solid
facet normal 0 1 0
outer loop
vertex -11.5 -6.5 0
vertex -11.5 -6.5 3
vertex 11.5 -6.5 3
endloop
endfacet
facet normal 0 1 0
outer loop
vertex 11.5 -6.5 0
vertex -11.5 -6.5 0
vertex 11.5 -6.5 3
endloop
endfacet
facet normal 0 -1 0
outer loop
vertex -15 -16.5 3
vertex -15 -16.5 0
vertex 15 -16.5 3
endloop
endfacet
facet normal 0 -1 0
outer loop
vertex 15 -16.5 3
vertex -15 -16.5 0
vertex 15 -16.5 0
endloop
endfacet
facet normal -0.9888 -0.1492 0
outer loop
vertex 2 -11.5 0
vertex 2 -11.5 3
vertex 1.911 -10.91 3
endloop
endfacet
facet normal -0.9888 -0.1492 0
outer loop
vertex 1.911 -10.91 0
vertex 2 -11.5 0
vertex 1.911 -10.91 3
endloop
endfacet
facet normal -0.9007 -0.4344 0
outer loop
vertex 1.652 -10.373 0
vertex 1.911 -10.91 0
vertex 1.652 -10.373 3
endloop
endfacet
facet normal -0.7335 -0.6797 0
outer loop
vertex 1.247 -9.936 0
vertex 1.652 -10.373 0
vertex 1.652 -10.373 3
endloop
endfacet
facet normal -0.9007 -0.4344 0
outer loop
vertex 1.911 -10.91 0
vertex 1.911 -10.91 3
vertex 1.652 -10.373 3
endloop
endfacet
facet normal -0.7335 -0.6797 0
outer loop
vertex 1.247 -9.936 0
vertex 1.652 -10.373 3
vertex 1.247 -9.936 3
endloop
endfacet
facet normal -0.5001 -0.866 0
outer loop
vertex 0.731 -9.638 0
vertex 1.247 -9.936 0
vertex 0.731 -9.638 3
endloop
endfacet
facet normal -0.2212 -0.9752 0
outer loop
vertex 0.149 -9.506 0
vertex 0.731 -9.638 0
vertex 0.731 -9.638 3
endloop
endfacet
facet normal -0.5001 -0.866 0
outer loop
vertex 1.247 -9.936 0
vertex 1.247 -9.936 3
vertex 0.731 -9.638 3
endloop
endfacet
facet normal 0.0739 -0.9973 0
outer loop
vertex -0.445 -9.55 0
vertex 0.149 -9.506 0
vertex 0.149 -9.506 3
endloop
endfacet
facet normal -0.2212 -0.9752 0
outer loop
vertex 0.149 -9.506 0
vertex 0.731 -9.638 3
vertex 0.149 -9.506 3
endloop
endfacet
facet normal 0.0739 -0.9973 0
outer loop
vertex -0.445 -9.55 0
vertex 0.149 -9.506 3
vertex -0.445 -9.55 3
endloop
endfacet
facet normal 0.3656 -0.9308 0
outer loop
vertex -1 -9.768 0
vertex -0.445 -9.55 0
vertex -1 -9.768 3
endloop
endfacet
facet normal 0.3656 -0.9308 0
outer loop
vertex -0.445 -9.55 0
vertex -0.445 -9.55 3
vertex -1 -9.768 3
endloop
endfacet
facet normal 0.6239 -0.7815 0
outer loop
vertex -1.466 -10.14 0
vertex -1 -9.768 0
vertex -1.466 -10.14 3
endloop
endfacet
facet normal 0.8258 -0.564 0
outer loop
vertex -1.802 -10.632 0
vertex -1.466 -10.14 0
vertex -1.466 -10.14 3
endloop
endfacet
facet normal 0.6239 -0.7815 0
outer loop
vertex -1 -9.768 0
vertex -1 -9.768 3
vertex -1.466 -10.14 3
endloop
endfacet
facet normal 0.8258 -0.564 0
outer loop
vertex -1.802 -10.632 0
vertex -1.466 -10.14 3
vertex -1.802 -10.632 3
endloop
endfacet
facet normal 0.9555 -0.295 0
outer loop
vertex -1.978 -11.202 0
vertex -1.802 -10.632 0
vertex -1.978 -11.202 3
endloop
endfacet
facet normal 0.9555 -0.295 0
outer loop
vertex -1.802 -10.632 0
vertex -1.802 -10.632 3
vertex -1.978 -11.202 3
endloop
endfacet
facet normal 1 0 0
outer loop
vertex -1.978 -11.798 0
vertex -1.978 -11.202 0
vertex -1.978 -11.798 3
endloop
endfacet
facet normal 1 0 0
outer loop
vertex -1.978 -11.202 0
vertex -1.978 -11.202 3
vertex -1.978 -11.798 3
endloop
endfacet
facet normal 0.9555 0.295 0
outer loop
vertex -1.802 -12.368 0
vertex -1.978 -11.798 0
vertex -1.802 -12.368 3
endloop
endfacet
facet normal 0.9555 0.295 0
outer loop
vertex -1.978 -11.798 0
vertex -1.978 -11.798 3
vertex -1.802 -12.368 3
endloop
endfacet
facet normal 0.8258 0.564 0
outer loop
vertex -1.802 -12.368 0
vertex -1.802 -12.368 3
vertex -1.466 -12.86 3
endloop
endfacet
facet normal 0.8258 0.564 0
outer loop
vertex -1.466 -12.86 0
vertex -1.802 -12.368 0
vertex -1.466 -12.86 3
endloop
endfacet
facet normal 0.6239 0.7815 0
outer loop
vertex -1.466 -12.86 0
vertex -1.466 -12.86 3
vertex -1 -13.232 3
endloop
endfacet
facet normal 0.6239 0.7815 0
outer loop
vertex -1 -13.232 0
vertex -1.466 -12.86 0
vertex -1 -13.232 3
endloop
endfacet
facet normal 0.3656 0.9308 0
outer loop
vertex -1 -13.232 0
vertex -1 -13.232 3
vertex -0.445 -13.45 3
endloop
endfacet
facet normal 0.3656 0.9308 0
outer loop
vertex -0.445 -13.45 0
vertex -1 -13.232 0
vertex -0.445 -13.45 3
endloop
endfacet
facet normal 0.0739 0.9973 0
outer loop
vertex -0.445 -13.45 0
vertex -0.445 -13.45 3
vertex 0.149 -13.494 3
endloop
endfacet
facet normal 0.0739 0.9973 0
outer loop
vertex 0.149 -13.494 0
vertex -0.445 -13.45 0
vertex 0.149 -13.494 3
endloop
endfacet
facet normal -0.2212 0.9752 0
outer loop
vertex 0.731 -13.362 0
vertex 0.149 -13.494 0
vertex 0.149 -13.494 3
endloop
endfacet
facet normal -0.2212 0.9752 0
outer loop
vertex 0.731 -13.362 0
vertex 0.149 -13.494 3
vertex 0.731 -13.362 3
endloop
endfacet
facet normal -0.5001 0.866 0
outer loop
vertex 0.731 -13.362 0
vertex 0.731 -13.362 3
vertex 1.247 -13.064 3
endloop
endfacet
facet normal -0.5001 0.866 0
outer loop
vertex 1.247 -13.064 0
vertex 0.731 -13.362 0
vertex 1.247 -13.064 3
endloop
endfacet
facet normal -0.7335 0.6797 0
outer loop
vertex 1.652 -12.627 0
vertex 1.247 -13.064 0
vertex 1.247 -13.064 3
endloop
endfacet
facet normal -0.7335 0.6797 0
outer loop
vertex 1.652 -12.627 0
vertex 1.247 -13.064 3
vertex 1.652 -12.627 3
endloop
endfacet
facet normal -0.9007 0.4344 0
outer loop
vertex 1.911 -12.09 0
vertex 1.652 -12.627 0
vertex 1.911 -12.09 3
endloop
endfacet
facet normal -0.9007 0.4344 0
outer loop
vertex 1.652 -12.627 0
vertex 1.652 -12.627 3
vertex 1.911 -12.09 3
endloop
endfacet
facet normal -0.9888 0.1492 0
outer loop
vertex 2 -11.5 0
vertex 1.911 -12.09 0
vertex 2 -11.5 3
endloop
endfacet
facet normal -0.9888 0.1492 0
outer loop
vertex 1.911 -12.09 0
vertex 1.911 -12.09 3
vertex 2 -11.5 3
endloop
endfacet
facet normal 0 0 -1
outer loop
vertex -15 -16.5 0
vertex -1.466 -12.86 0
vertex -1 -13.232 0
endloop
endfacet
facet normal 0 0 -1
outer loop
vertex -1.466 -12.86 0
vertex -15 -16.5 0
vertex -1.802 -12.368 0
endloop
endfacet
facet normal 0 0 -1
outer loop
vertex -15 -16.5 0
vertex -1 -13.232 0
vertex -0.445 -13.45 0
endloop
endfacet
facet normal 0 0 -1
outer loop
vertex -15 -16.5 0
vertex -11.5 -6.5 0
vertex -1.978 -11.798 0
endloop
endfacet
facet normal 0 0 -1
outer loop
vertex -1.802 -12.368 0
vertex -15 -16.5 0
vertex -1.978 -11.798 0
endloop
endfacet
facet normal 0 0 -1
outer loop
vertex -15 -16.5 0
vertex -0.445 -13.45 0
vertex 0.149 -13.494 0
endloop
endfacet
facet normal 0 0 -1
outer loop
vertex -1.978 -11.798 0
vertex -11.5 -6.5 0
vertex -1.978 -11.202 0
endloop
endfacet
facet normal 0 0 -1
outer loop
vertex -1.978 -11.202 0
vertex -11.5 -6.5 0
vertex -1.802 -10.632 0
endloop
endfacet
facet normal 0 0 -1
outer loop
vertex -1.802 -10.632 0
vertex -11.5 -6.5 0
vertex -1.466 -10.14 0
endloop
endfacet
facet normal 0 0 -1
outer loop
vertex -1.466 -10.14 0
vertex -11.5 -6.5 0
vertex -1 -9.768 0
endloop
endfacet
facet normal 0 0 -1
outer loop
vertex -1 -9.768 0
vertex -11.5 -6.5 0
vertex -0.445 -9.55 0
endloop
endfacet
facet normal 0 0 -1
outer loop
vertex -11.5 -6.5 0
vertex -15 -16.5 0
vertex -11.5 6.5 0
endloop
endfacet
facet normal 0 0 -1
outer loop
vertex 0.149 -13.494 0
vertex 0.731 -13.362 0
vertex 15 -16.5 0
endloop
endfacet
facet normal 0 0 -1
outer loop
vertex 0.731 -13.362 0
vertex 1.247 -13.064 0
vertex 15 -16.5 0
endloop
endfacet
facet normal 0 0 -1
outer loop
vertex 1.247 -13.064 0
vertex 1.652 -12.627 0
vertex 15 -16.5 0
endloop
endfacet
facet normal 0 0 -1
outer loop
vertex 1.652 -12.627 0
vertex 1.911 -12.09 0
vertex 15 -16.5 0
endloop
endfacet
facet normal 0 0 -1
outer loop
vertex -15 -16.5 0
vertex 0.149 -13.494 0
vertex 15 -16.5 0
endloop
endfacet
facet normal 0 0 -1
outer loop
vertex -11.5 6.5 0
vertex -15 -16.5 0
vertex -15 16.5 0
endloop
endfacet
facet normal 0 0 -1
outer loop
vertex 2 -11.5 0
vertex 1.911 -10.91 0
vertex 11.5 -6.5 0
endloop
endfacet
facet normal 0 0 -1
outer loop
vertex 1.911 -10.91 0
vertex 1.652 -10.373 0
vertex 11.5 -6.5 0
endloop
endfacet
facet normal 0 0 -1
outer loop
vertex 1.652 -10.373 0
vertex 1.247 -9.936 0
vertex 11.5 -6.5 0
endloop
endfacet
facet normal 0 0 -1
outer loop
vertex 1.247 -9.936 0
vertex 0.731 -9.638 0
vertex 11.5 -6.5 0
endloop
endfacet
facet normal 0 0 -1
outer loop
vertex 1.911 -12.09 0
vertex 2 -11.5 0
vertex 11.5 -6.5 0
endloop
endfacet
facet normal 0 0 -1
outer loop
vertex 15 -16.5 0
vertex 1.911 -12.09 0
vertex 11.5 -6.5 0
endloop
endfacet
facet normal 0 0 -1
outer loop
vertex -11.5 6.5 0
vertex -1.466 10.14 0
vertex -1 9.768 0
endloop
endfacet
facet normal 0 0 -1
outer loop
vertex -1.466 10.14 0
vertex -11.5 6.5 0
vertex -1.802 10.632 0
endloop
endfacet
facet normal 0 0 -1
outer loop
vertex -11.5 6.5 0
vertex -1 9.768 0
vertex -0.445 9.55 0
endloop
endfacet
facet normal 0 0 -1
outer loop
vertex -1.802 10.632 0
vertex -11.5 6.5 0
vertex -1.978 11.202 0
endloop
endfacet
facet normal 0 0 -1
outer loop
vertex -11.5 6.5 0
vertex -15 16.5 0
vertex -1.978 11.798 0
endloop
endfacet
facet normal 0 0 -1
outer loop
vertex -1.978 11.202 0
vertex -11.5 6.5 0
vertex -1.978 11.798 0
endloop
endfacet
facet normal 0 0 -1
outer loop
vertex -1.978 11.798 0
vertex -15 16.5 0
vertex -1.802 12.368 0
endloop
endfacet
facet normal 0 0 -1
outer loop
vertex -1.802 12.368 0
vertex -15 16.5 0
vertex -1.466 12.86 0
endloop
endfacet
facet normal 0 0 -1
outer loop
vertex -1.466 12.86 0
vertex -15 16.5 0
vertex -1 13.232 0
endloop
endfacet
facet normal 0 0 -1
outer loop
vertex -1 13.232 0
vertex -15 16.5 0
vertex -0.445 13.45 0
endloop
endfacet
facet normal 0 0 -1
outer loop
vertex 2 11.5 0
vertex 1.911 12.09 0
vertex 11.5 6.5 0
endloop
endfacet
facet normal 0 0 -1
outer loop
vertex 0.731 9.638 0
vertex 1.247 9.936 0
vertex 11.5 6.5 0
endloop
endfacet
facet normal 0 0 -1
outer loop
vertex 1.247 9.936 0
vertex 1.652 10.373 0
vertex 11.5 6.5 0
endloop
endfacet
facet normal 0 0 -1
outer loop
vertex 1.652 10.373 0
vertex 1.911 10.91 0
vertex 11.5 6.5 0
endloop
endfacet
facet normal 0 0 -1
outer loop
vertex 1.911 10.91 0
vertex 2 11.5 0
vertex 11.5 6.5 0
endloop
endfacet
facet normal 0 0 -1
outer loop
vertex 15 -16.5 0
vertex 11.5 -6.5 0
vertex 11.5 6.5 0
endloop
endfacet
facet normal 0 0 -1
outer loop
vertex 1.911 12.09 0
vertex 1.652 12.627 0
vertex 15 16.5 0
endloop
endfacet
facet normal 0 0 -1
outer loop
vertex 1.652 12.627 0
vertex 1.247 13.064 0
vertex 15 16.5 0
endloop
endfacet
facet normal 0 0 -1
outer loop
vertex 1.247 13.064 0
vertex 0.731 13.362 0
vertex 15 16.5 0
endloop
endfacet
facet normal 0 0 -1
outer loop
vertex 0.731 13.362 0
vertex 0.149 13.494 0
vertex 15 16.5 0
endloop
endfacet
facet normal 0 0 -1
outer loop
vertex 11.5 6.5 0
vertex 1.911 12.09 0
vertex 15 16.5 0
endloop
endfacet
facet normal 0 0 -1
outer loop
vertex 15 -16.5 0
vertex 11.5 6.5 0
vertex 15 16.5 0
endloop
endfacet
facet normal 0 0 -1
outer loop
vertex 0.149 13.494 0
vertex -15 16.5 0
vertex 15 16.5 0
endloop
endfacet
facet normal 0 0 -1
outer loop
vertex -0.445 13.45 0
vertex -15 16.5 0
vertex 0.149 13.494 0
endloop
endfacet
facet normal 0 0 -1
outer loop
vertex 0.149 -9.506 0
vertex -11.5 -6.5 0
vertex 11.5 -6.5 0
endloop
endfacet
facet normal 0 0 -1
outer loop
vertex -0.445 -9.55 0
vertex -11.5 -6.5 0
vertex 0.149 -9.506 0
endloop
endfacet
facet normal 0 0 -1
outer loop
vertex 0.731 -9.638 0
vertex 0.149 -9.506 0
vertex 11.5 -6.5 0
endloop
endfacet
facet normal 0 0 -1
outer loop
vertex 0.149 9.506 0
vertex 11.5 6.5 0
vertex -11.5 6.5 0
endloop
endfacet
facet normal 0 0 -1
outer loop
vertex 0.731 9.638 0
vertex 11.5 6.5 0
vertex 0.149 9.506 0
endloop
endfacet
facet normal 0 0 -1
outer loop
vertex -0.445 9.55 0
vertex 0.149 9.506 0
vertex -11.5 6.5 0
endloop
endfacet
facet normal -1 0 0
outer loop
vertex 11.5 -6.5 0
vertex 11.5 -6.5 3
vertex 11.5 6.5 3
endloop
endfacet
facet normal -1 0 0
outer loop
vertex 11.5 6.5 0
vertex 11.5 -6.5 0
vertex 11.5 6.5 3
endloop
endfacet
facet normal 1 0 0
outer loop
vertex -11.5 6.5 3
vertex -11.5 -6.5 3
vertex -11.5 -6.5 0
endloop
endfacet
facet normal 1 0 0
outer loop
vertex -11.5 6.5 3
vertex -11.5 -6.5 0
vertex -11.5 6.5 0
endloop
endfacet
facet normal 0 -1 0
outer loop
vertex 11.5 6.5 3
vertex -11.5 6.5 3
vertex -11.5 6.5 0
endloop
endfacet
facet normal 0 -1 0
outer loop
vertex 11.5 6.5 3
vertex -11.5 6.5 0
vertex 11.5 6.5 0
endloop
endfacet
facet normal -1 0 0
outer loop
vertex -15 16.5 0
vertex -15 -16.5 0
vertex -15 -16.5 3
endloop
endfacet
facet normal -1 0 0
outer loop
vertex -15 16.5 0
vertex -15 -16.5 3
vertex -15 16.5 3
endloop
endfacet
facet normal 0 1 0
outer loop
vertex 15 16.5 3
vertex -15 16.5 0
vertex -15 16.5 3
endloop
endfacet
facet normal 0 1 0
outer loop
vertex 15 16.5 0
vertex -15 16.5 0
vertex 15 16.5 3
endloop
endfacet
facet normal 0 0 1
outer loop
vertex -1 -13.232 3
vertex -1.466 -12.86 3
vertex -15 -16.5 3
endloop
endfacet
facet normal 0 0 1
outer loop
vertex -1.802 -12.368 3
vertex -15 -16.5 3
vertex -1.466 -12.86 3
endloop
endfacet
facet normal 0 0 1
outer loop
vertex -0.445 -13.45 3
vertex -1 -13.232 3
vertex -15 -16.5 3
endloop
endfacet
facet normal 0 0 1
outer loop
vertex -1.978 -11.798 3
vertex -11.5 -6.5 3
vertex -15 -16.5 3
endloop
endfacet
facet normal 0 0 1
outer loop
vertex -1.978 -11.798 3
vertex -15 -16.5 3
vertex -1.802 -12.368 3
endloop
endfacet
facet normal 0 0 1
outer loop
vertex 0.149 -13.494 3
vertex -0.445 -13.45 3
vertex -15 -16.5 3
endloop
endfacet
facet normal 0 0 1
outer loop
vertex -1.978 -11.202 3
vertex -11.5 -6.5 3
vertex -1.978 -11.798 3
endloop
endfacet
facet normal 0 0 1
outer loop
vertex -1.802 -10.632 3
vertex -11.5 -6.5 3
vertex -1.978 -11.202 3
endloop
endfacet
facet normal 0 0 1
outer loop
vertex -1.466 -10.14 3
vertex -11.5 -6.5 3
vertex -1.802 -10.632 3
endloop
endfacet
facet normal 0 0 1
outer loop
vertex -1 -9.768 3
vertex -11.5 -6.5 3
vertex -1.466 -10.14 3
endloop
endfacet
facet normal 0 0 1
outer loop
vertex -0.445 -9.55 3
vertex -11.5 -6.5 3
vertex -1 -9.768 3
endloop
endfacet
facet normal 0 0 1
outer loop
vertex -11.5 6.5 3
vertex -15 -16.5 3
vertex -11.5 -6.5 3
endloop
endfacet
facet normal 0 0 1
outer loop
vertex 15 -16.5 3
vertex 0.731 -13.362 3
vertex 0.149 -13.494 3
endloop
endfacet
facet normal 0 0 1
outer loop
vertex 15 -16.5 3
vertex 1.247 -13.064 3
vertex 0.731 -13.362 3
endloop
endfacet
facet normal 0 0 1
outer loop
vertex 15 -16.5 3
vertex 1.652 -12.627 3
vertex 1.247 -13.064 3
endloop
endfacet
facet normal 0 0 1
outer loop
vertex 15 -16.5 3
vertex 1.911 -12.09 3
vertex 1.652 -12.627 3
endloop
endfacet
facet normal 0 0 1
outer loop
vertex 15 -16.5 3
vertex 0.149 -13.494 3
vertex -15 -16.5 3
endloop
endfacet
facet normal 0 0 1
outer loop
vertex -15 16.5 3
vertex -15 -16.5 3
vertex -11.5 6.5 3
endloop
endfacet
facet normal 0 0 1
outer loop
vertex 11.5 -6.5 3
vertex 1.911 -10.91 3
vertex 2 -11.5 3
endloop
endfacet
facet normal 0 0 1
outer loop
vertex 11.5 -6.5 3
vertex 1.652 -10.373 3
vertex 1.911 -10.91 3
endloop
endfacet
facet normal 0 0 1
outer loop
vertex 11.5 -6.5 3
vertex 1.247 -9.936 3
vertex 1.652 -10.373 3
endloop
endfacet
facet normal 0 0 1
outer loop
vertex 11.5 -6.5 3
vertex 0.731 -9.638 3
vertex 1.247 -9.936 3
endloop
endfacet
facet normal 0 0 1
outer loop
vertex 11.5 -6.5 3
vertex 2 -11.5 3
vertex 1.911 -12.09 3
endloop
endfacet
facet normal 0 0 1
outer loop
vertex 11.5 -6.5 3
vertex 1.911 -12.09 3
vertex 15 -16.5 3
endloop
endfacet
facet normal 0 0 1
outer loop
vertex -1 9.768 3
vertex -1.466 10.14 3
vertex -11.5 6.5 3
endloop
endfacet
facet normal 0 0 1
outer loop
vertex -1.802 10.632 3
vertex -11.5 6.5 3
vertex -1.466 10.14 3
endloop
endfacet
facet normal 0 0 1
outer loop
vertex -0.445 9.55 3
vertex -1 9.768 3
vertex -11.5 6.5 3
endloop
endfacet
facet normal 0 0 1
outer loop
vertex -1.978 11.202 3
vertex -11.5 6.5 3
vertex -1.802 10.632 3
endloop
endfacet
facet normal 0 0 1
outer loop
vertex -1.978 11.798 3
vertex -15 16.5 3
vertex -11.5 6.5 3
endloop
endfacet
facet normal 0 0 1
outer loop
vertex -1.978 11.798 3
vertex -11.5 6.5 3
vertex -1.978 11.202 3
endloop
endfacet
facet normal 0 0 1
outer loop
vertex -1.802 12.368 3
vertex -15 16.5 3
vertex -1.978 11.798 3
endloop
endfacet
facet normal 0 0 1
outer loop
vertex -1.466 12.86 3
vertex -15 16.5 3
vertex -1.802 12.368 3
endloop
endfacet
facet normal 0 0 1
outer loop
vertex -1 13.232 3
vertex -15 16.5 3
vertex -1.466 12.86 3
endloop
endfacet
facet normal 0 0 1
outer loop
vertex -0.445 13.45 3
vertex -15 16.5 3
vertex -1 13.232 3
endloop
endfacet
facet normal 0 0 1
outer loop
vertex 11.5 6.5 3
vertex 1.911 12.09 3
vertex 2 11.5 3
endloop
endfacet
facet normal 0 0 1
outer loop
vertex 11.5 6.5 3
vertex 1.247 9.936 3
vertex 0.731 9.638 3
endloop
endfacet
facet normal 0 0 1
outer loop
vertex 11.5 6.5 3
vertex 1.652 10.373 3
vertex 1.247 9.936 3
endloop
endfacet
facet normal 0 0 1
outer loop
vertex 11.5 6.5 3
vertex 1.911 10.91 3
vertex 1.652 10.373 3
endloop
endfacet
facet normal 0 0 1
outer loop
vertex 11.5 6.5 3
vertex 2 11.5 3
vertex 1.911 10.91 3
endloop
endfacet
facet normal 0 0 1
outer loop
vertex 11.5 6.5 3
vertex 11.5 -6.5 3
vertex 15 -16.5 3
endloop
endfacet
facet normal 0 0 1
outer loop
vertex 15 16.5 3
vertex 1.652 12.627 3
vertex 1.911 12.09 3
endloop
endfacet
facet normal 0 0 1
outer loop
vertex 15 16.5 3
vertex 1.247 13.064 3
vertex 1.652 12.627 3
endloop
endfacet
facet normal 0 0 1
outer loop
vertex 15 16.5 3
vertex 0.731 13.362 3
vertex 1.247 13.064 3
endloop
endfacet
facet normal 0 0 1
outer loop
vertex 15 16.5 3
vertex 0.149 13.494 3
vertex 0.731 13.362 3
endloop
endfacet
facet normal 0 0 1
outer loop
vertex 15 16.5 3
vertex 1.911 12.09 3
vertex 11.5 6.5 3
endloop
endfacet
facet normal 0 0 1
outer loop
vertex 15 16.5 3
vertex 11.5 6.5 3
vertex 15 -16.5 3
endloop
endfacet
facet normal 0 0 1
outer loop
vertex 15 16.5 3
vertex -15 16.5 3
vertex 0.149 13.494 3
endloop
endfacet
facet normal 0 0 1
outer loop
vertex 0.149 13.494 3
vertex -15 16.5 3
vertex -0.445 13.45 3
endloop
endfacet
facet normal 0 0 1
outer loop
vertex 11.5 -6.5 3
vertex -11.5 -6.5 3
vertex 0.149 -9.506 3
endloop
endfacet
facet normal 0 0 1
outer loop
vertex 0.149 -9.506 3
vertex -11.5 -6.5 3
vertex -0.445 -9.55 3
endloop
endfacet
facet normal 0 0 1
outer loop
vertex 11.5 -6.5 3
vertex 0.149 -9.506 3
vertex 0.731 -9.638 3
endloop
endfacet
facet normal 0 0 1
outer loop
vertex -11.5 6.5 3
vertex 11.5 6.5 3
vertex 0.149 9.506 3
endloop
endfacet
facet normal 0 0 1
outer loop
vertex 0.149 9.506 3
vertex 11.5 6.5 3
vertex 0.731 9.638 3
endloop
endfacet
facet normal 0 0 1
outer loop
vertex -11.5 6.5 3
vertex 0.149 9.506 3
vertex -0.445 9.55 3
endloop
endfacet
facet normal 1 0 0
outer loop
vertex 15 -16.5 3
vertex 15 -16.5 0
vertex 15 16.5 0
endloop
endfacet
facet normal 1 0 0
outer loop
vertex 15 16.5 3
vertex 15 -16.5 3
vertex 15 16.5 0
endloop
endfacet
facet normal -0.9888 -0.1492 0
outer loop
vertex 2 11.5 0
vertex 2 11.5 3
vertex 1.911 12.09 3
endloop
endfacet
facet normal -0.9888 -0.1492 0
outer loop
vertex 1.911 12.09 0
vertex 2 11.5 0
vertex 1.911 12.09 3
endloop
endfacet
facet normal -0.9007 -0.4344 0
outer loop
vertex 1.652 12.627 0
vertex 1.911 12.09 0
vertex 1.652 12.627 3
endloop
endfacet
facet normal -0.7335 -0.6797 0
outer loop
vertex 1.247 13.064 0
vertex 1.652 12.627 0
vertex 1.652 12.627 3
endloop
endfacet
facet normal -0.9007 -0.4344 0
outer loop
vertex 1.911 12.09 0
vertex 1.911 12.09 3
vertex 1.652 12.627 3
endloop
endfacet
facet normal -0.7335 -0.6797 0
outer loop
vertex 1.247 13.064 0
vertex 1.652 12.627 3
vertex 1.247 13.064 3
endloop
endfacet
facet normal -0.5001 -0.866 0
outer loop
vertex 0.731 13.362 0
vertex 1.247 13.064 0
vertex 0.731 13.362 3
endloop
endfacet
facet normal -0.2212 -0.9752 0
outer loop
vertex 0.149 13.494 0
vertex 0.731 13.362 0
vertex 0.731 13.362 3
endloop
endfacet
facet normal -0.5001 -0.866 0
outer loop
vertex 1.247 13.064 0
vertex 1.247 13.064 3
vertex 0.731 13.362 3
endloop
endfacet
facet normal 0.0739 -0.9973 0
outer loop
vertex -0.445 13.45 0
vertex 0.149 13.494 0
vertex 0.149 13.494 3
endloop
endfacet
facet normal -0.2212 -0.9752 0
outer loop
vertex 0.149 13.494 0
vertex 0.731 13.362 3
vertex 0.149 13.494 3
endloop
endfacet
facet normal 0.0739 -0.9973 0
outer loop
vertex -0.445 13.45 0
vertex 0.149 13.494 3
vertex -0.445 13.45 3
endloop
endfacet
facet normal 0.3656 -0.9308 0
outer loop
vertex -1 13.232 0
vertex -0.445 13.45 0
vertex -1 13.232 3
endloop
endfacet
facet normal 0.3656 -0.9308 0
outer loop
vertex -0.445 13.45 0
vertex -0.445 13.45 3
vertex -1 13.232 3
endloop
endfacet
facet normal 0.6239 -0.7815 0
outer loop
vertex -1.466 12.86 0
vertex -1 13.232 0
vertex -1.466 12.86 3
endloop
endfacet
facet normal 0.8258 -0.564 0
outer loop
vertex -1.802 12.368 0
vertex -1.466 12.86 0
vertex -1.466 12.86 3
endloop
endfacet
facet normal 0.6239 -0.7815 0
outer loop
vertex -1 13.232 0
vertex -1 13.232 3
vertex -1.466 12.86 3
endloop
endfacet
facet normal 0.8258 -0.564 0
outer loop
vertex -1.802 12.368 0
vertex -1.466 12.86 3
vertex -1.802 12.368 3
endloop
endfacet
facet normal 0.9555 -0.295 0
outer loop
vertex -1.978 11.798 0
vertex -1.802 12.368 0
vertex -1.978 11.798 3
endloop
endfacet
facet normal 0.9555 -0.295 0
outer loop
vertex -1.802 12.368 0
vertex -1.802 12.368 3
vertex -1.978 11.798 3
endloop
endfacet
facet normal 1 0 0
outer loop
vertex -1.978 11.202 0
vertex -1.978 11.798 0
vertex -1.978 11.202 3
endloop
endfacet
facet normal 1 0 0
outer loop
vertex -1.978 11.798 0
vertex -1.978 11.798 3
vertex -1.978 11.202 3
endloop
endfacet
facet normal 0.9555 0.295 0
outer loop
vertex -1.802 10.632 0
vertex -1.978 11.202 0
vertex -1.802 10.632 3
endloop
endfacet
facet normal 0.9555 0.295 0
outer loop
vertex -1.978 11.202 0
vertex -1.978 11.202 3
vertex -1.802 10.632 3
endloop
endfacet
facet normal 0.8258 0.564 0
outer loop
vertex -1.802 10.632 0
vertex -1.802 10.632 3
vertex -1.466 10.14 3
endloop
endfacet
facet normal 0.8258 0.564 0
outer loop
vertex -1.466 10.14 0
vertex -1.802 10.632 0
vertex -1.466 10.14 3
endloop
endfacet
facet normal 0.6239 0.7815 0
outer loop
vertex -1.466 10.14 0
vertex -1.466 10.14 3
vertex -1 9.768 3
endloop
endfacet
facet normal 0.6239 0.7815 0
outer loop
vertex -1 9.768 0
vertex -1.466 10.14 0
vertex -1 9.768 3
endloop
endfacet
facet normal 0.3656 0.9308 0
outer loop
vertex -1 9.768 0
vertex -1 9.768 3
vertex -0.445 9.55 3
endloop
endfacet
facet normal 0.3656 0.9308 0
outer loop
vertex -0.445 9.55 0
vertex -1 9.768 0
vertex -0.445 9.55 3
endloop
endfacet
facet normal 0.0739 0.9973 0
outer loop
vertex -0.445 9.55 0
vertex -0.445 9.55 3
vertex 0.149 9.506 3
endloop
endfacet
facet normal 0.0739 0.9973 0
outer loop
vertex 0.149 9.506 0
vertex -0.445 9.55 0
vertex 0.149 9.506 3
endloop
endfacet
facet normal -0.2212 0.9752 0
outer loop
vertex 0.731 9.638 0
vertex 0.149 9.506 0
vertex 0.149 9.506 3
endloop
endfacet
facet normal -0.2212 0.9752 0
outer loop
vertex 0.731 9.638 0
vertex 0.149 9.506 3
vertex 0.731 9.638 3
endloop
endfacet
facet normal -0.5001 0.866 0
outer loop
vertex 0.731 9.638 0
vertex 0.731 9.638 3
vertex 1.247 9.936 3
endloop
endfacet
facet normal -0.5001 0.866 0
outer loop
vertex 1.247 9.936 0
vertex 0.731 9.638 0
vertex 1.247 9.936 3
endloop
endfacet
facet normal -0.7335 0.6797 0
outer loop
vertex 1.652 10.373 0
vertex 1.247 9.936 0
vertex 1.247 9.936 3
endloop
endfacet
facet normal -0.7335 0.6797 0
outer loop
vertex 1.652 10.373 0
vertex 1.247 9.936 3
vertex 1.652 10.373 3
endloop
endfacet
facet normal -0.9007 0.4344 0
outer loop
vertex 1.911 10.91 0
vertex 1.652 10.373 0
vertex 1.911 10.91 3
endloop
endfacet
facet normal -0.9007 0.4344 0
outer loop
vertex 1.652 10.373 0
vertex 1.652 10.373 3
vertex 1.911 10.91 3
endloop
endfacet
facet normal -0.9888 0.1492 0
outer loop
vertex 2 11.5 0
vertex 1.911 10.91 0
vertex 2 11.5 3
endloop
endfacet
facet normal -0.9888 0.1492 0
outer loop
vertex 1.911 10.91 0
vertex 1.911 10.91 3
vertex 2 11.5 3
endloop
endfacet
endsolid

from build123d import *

# Parameters (mm, degrees)
SKETCH1_W           = 30
SKETCH1_H           = 33
BOSS_EXTRUDE1_DEPTH = 3
SKETCH2_W           = 23
SKETCH2_H           = 13
CUT_EXTRUDE1_DEPTH  = 23.5
SKETCH3_R           = 2
CUT_EXTRUDE2_DEPTH  = 3


with BuildPart() as part:
    # Sketch1 → Boss-Extrude1 (new body)
    with BuildSketch(Plane.XY):
        Rectangle(SKETCH1_W, SKETCH1_H)
    extrude(amount=BOSS_EXTRUDE1_DEPTH)

    # Sketch2 → Cut-Extrude1 (cut, through all)
    with BuildSketch(Plane.XY.offset(3)):
        Rectangle(SKETCH2_W, SKETCH2_H)
    extrude(amount=-CUT_EXTRUDE1_DEPTH, mode=Mode.SUBTRACT)

    # Sketch3 → Cut-Extrude2 (cut)
    with BuildSketch(Plane.XY.offset(3)):
        with Locations((0, 11.5)):
            Circle(SKETCH3_R)
        with Locations((0, -11.5)):
            Circle(SKETCH3_R)
    extrude(amount=-CUT_EXTRUDE2_DEPTH, mode=Mode.SUBTRACT)


solid = part.part
